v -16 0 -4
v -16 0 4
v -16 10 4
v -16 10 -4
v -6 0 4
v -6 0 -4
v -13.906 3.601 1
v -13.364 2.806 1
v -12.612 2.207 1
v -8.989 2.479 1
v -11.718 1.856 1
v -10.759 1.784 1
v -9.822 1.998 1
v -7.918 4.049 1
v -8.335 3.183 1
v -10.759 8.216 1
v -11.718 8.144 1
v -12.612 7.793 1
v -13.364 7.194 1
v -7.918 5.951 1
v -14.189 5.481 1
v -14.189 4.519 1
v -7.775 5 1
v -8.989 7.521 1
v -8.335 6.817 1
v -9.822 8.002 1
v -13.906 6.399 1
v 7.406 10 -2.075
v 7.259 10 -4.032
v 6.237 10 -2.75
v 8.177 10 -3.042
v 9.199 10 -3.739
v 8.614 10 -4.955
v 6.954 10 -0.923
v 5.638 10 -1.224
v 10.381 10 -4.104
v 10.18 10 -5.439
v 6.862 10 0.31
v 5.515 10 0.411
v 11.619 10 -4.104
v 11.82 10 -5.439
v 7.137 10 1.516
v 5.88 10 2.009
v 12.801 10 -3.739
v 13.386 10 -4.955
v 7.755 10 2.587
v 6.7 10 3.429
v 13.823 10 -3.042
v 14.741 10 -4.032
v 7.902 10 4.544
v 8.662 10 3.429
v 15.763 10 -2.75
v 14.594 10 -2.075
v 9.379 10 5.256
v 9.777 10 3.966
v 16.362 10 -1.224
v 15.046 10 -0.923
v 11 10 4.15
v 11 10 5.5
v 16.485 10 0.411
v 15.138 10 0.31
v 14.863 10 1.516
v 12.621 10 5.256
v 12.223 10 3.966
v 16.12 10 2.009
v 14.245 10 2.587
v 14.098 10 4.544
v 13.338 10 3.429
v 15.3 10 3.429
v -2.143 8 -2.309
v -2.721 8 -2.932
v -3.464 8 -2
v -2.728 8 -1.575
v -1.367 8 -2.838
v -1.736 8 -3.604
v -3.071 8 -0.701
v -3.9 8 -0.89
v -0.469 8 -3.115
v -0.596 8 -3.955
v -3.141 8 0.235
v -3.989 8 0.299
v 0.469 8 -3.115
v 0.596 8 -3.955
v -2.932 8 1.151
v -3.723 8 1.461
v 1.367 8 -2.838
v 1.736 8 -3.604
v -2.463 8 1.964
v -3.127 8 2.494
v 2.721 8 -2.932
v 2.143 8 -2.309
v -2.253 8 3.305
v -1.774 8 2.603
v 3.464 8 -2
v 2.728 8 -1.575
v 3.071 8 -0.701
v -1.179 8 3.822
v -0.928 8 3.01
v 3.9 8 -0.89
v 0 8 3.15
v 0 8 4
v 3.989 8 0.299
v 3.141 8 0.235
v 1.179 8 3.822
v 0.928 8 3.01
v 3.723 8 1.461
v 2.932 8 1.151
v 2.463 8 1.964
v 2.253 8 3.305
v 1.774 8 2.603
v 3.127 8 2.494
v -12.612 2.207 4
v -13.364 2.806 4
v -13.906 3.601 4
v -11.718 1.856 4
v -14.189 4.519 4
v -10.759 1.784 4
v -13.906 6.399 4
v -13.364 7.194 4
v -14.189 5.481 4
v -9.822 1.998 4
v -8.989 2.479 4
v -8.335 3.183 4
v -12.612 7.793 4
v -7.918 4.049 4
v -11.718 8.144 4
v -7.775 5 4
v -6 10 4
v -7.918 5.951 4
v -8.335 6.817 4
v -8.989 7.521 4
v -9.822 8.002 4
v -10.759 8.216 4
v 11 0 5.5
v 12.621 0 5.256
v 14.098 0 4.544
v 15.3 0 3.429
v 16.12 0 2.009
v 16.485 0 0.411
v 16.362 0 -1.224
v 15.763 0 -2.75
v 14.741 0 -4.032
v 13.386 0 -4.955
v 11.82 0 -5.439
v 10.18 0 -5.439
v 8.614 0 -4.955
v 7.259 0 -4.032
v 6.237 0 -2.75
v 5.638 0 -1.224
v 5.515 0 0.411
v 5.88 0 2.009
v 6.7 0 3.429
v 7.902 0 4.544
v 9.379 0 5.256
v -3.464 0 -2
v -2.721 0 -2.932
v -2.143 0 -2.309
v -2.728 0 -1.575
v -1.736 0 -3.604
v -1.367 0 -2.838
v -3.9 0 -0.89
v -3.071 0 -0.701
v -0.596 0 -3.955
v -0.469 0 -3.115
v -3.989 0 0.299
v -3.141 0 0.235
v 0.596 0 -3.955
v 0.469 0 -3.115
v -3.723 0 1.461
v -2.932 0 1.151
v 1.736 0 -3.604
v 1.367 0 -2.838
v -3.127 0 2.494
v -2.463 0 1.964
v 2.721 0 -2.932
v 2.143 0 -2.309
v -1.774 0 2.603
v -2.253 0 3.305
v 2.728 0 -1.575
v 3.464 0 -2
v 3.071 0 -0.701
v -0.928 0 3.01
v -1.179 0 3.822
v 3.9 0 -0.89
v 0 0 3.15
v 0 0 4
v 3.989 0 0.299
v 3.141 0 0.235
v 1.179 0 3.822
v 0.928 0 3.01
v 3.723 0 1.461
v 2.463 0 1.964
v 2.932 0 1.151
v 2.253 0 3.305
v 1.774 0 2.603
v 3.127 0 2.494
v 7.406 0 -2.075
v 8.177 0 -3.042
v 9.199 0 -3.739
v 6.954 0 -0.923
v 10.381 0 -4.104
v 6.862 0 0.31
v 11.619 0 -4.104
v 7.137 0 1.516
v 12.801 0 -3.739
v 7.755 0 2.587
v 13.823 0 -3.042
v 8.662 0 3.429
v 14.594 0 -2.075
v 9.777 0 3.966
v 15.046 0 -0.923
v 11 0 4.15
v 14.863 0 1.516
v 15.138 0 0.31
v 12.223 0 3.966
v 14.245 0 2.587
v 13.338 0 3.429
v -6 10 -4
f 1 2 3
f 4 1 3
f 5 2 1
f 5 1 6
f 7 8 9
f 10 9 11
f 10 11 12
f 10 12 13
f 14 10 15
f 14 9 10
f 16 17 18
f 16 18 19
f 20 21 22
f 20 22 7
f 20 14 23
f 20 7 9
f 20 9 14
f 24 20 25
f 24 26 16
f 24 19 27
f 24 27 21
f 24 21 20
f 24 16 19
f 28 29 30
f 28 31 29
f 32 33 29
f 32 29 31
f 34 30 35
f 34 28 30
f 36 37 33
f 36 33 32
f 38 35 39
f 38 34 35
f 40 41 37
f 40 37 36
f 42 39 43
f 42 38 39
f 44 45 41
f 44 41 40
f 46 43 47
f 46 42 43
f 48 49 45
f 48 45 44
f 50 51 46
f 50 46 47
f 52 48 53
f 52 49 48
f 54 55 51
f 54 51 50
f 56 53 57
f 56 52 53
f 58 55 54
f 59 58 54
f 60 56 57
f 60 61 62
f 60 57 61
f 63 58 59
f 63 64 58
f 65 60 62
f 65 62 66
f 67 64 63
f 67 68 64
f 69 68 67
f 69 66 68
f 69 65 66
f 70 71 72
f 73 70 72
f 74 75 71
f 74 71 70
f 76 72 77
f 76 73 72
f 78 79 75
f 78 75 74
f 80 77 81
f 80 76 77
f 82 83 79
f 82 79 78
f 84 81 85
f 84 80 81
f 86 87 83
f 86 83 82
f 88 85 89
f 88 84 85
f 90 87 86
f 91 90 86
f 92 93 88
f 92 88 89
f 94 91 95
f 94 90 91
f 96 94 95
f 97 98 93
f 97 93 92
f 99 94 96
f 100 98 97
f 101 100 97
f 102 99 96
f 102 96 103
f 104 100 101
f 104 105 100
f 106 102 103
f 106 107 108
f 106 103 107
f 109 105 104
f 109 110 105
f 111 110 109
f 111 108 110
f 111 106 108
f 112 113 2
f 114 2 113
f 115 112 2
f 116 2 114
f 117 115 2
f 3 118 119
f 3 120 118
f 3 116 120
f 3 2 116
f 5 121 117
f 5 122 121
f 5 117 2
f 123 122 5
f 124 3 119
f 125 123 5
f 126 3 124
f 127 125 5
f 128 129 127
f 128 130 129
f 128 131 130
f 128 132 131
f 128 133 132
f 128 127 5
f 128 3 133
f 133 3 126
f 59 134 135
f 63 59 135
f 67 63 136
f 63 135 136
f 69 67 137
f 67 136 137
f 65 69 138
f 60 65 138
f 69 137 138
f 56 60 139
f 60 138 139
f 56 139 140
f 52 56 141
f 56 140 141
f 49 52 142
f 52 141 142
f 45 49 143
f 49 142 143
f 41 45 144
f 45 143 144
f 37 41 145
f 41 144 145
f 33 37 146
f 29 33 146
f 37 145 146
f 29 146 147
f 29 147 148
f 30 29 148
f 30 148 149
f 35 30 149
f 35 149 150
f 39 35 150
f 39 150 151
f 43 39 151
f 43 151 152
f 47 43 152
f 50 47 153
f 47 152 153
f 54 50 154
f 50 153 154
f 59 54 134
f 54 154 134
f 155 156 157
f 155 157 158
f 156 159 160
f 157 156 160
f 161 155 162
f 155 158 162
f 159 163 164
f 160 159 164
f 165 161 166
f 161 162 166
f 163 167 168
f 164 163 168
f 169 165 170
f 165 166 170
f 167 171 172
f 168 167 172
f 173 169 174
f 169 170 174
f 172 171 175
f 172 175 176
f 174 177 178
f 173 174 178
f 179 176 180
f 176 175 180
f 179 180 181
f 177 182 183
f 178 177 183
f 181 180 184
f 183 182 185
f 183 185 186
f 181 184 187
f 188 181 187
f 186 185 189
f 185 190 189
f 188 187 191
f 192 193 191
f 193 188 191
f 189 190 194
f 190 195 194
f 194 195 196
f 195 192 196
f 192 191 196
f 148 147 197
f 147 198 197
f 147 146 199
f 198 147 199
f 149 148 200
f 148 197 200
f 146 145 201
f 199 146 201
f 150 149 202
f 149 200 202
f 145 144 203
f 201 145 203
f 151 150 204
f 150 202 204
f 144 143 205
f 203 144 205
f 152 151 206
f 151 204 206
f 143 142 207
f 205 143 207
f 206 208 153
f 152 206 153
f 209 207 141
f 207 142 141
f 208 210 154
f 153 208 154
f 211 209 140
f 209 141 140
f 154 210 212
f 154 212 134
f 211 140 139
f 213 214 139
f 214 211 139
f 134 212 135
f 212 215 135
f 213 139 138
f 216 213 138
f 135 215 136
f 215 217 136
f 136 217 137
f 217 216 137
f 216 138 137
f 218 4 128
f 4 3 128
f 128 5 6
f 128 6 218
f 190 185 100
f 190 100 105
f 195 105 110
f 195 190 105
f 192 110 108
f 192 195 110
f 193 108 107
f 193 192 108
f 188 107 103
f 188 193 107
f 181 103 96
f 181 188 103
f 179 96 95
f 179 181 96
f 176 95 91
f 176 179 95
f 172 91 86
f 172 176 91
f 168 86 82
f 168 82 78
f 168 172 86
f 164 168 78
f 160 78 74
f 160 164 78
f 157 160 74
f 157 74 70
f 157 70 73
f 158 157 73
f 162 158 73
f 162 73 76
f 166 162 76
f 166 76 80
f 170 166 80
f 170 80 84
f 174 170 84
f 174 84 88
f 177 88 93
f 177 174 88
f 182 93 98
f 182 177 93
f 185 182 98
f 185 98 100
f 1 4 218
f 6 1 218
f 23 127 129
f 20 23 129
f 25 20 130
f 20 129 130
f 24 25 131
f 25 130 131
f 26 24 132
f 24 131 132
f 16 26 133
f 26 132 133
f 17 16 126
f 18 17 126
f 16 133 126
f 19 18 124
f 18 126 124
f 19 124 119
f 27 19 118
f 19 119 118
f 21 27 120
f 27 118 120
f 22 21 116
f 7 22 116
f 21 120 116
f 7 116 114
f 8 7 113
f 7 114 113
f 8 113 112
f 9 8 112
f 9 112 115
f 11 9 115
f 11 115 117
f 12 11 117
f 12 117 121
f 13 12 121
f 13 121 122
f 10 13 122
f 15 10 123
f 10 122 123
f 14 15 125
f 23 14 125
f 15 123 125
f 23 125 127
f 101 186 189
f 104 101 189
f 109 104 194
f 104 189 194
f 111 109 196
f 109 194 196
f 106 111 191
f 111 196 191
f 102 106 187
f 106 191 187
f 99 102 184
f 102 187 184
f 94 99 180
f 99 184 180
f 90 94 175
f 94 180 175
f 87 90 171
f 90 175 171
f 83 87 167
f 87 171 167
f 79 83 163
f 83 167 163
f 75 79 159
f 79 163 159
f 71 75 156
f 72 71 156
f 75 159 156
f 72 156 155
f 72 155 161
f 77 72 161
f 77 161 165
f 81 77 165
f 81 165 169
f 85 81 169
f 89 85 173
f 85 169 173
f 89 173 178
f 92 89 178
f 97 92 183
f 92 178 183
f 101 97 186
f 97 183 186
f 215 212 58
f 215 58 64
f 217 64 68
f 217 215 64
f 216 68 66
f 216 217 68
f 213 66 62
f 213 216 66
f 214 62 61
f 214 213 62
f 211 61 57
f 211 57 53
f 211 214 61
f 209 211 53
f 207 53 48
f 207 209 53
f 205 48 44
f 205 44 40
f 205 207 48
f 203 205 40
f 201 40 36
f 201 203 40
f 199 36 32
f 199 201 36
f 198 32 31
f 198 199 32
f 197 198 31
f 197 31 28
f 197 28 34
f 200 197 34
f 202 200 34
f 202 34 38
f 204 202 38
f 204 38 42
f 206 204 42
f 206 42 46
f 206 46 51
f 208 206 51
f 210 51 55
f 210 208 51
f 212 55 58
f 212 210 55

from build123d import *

# Parameters (mm, degrees)
SKETCH1_R           = 4
SKETCH1_R_2         = 3.15
BOSS_EXTRUDE1_DEPTH = 8
SKETCH2_R           = 5.5
SKETCH2_R_2         = 4.15
BOSS_EXTRUDE2_DEPTH = 10
SKETCH3_W           = 10
SKETCH3_H           = 10
BOSS_EXTRUDE3_DEPTH = 4
SKETCH4_R           = 3.225
CUT_EXTRUDE1_DEPTH  = 3


with BuildPart() as part:
    # Sketch1 → Boss-Extrude1 (new body)
    with BuildSketch(Plane(origin=(0, 0, 0), x_dir=(1, 0, 0), z_dir=(0, 1, 0))):
        with Locations(Location((0, 0, 0), (0, 0, 270))):
            Circle(SKETCH1_R)
        with Locations(Location((0, 0, 0), (0, 0, 270))):
            Circle(SKETCH1_R_2, mode=Mode.SUBTRACT)
    extrude(amount=BOSS_EXTRUDE1_DEPTH)


with BuildPart() as body_2:
    # Sketch2 → Boss-Extrude2 (new body)
    with BuildSketch(Plane(origin=(0, 0, 0), x_dir=(1, 0, 0), z_dir=(0, 1, 0))):
        with Locations(Location((11, 0, 0), (0, 0, 270))):
            Circle(SKETCH2_R)
        with Locations(Location((11, 0, 0), (0, 0, 270))):
            Circle(SKETCH2_R_2, mode=Mode.SUBTRACT)
    extrude(amount=BOSS_EXTRUDE2_DEPTH)


with BuildPart() as body_3:
    # Sketch3 → Boss-Extrude3 (new, symmetric)
    with BuildSketch(Plane.XY):
        with Locations((-11, 5)):
            Rectangle(SKETCH3_W, SKETCH3_H)
    extrude(amount=BOSS_EXTRUDE3_DEPTH, both=True)

    # Sketch4 → Cut-Extrude1 (cut)
    with BuildSketch(Plane.XY.offset(4)):
        with Locations((-11, 5)):
            Circle(SKETCH4_R)
    extrude(amount=-CUT_EXTRUDE1_DEPTH, mode=Mode.SUBTRACT)


solid = Compound([part.part, body_2.part, body_3.part])
